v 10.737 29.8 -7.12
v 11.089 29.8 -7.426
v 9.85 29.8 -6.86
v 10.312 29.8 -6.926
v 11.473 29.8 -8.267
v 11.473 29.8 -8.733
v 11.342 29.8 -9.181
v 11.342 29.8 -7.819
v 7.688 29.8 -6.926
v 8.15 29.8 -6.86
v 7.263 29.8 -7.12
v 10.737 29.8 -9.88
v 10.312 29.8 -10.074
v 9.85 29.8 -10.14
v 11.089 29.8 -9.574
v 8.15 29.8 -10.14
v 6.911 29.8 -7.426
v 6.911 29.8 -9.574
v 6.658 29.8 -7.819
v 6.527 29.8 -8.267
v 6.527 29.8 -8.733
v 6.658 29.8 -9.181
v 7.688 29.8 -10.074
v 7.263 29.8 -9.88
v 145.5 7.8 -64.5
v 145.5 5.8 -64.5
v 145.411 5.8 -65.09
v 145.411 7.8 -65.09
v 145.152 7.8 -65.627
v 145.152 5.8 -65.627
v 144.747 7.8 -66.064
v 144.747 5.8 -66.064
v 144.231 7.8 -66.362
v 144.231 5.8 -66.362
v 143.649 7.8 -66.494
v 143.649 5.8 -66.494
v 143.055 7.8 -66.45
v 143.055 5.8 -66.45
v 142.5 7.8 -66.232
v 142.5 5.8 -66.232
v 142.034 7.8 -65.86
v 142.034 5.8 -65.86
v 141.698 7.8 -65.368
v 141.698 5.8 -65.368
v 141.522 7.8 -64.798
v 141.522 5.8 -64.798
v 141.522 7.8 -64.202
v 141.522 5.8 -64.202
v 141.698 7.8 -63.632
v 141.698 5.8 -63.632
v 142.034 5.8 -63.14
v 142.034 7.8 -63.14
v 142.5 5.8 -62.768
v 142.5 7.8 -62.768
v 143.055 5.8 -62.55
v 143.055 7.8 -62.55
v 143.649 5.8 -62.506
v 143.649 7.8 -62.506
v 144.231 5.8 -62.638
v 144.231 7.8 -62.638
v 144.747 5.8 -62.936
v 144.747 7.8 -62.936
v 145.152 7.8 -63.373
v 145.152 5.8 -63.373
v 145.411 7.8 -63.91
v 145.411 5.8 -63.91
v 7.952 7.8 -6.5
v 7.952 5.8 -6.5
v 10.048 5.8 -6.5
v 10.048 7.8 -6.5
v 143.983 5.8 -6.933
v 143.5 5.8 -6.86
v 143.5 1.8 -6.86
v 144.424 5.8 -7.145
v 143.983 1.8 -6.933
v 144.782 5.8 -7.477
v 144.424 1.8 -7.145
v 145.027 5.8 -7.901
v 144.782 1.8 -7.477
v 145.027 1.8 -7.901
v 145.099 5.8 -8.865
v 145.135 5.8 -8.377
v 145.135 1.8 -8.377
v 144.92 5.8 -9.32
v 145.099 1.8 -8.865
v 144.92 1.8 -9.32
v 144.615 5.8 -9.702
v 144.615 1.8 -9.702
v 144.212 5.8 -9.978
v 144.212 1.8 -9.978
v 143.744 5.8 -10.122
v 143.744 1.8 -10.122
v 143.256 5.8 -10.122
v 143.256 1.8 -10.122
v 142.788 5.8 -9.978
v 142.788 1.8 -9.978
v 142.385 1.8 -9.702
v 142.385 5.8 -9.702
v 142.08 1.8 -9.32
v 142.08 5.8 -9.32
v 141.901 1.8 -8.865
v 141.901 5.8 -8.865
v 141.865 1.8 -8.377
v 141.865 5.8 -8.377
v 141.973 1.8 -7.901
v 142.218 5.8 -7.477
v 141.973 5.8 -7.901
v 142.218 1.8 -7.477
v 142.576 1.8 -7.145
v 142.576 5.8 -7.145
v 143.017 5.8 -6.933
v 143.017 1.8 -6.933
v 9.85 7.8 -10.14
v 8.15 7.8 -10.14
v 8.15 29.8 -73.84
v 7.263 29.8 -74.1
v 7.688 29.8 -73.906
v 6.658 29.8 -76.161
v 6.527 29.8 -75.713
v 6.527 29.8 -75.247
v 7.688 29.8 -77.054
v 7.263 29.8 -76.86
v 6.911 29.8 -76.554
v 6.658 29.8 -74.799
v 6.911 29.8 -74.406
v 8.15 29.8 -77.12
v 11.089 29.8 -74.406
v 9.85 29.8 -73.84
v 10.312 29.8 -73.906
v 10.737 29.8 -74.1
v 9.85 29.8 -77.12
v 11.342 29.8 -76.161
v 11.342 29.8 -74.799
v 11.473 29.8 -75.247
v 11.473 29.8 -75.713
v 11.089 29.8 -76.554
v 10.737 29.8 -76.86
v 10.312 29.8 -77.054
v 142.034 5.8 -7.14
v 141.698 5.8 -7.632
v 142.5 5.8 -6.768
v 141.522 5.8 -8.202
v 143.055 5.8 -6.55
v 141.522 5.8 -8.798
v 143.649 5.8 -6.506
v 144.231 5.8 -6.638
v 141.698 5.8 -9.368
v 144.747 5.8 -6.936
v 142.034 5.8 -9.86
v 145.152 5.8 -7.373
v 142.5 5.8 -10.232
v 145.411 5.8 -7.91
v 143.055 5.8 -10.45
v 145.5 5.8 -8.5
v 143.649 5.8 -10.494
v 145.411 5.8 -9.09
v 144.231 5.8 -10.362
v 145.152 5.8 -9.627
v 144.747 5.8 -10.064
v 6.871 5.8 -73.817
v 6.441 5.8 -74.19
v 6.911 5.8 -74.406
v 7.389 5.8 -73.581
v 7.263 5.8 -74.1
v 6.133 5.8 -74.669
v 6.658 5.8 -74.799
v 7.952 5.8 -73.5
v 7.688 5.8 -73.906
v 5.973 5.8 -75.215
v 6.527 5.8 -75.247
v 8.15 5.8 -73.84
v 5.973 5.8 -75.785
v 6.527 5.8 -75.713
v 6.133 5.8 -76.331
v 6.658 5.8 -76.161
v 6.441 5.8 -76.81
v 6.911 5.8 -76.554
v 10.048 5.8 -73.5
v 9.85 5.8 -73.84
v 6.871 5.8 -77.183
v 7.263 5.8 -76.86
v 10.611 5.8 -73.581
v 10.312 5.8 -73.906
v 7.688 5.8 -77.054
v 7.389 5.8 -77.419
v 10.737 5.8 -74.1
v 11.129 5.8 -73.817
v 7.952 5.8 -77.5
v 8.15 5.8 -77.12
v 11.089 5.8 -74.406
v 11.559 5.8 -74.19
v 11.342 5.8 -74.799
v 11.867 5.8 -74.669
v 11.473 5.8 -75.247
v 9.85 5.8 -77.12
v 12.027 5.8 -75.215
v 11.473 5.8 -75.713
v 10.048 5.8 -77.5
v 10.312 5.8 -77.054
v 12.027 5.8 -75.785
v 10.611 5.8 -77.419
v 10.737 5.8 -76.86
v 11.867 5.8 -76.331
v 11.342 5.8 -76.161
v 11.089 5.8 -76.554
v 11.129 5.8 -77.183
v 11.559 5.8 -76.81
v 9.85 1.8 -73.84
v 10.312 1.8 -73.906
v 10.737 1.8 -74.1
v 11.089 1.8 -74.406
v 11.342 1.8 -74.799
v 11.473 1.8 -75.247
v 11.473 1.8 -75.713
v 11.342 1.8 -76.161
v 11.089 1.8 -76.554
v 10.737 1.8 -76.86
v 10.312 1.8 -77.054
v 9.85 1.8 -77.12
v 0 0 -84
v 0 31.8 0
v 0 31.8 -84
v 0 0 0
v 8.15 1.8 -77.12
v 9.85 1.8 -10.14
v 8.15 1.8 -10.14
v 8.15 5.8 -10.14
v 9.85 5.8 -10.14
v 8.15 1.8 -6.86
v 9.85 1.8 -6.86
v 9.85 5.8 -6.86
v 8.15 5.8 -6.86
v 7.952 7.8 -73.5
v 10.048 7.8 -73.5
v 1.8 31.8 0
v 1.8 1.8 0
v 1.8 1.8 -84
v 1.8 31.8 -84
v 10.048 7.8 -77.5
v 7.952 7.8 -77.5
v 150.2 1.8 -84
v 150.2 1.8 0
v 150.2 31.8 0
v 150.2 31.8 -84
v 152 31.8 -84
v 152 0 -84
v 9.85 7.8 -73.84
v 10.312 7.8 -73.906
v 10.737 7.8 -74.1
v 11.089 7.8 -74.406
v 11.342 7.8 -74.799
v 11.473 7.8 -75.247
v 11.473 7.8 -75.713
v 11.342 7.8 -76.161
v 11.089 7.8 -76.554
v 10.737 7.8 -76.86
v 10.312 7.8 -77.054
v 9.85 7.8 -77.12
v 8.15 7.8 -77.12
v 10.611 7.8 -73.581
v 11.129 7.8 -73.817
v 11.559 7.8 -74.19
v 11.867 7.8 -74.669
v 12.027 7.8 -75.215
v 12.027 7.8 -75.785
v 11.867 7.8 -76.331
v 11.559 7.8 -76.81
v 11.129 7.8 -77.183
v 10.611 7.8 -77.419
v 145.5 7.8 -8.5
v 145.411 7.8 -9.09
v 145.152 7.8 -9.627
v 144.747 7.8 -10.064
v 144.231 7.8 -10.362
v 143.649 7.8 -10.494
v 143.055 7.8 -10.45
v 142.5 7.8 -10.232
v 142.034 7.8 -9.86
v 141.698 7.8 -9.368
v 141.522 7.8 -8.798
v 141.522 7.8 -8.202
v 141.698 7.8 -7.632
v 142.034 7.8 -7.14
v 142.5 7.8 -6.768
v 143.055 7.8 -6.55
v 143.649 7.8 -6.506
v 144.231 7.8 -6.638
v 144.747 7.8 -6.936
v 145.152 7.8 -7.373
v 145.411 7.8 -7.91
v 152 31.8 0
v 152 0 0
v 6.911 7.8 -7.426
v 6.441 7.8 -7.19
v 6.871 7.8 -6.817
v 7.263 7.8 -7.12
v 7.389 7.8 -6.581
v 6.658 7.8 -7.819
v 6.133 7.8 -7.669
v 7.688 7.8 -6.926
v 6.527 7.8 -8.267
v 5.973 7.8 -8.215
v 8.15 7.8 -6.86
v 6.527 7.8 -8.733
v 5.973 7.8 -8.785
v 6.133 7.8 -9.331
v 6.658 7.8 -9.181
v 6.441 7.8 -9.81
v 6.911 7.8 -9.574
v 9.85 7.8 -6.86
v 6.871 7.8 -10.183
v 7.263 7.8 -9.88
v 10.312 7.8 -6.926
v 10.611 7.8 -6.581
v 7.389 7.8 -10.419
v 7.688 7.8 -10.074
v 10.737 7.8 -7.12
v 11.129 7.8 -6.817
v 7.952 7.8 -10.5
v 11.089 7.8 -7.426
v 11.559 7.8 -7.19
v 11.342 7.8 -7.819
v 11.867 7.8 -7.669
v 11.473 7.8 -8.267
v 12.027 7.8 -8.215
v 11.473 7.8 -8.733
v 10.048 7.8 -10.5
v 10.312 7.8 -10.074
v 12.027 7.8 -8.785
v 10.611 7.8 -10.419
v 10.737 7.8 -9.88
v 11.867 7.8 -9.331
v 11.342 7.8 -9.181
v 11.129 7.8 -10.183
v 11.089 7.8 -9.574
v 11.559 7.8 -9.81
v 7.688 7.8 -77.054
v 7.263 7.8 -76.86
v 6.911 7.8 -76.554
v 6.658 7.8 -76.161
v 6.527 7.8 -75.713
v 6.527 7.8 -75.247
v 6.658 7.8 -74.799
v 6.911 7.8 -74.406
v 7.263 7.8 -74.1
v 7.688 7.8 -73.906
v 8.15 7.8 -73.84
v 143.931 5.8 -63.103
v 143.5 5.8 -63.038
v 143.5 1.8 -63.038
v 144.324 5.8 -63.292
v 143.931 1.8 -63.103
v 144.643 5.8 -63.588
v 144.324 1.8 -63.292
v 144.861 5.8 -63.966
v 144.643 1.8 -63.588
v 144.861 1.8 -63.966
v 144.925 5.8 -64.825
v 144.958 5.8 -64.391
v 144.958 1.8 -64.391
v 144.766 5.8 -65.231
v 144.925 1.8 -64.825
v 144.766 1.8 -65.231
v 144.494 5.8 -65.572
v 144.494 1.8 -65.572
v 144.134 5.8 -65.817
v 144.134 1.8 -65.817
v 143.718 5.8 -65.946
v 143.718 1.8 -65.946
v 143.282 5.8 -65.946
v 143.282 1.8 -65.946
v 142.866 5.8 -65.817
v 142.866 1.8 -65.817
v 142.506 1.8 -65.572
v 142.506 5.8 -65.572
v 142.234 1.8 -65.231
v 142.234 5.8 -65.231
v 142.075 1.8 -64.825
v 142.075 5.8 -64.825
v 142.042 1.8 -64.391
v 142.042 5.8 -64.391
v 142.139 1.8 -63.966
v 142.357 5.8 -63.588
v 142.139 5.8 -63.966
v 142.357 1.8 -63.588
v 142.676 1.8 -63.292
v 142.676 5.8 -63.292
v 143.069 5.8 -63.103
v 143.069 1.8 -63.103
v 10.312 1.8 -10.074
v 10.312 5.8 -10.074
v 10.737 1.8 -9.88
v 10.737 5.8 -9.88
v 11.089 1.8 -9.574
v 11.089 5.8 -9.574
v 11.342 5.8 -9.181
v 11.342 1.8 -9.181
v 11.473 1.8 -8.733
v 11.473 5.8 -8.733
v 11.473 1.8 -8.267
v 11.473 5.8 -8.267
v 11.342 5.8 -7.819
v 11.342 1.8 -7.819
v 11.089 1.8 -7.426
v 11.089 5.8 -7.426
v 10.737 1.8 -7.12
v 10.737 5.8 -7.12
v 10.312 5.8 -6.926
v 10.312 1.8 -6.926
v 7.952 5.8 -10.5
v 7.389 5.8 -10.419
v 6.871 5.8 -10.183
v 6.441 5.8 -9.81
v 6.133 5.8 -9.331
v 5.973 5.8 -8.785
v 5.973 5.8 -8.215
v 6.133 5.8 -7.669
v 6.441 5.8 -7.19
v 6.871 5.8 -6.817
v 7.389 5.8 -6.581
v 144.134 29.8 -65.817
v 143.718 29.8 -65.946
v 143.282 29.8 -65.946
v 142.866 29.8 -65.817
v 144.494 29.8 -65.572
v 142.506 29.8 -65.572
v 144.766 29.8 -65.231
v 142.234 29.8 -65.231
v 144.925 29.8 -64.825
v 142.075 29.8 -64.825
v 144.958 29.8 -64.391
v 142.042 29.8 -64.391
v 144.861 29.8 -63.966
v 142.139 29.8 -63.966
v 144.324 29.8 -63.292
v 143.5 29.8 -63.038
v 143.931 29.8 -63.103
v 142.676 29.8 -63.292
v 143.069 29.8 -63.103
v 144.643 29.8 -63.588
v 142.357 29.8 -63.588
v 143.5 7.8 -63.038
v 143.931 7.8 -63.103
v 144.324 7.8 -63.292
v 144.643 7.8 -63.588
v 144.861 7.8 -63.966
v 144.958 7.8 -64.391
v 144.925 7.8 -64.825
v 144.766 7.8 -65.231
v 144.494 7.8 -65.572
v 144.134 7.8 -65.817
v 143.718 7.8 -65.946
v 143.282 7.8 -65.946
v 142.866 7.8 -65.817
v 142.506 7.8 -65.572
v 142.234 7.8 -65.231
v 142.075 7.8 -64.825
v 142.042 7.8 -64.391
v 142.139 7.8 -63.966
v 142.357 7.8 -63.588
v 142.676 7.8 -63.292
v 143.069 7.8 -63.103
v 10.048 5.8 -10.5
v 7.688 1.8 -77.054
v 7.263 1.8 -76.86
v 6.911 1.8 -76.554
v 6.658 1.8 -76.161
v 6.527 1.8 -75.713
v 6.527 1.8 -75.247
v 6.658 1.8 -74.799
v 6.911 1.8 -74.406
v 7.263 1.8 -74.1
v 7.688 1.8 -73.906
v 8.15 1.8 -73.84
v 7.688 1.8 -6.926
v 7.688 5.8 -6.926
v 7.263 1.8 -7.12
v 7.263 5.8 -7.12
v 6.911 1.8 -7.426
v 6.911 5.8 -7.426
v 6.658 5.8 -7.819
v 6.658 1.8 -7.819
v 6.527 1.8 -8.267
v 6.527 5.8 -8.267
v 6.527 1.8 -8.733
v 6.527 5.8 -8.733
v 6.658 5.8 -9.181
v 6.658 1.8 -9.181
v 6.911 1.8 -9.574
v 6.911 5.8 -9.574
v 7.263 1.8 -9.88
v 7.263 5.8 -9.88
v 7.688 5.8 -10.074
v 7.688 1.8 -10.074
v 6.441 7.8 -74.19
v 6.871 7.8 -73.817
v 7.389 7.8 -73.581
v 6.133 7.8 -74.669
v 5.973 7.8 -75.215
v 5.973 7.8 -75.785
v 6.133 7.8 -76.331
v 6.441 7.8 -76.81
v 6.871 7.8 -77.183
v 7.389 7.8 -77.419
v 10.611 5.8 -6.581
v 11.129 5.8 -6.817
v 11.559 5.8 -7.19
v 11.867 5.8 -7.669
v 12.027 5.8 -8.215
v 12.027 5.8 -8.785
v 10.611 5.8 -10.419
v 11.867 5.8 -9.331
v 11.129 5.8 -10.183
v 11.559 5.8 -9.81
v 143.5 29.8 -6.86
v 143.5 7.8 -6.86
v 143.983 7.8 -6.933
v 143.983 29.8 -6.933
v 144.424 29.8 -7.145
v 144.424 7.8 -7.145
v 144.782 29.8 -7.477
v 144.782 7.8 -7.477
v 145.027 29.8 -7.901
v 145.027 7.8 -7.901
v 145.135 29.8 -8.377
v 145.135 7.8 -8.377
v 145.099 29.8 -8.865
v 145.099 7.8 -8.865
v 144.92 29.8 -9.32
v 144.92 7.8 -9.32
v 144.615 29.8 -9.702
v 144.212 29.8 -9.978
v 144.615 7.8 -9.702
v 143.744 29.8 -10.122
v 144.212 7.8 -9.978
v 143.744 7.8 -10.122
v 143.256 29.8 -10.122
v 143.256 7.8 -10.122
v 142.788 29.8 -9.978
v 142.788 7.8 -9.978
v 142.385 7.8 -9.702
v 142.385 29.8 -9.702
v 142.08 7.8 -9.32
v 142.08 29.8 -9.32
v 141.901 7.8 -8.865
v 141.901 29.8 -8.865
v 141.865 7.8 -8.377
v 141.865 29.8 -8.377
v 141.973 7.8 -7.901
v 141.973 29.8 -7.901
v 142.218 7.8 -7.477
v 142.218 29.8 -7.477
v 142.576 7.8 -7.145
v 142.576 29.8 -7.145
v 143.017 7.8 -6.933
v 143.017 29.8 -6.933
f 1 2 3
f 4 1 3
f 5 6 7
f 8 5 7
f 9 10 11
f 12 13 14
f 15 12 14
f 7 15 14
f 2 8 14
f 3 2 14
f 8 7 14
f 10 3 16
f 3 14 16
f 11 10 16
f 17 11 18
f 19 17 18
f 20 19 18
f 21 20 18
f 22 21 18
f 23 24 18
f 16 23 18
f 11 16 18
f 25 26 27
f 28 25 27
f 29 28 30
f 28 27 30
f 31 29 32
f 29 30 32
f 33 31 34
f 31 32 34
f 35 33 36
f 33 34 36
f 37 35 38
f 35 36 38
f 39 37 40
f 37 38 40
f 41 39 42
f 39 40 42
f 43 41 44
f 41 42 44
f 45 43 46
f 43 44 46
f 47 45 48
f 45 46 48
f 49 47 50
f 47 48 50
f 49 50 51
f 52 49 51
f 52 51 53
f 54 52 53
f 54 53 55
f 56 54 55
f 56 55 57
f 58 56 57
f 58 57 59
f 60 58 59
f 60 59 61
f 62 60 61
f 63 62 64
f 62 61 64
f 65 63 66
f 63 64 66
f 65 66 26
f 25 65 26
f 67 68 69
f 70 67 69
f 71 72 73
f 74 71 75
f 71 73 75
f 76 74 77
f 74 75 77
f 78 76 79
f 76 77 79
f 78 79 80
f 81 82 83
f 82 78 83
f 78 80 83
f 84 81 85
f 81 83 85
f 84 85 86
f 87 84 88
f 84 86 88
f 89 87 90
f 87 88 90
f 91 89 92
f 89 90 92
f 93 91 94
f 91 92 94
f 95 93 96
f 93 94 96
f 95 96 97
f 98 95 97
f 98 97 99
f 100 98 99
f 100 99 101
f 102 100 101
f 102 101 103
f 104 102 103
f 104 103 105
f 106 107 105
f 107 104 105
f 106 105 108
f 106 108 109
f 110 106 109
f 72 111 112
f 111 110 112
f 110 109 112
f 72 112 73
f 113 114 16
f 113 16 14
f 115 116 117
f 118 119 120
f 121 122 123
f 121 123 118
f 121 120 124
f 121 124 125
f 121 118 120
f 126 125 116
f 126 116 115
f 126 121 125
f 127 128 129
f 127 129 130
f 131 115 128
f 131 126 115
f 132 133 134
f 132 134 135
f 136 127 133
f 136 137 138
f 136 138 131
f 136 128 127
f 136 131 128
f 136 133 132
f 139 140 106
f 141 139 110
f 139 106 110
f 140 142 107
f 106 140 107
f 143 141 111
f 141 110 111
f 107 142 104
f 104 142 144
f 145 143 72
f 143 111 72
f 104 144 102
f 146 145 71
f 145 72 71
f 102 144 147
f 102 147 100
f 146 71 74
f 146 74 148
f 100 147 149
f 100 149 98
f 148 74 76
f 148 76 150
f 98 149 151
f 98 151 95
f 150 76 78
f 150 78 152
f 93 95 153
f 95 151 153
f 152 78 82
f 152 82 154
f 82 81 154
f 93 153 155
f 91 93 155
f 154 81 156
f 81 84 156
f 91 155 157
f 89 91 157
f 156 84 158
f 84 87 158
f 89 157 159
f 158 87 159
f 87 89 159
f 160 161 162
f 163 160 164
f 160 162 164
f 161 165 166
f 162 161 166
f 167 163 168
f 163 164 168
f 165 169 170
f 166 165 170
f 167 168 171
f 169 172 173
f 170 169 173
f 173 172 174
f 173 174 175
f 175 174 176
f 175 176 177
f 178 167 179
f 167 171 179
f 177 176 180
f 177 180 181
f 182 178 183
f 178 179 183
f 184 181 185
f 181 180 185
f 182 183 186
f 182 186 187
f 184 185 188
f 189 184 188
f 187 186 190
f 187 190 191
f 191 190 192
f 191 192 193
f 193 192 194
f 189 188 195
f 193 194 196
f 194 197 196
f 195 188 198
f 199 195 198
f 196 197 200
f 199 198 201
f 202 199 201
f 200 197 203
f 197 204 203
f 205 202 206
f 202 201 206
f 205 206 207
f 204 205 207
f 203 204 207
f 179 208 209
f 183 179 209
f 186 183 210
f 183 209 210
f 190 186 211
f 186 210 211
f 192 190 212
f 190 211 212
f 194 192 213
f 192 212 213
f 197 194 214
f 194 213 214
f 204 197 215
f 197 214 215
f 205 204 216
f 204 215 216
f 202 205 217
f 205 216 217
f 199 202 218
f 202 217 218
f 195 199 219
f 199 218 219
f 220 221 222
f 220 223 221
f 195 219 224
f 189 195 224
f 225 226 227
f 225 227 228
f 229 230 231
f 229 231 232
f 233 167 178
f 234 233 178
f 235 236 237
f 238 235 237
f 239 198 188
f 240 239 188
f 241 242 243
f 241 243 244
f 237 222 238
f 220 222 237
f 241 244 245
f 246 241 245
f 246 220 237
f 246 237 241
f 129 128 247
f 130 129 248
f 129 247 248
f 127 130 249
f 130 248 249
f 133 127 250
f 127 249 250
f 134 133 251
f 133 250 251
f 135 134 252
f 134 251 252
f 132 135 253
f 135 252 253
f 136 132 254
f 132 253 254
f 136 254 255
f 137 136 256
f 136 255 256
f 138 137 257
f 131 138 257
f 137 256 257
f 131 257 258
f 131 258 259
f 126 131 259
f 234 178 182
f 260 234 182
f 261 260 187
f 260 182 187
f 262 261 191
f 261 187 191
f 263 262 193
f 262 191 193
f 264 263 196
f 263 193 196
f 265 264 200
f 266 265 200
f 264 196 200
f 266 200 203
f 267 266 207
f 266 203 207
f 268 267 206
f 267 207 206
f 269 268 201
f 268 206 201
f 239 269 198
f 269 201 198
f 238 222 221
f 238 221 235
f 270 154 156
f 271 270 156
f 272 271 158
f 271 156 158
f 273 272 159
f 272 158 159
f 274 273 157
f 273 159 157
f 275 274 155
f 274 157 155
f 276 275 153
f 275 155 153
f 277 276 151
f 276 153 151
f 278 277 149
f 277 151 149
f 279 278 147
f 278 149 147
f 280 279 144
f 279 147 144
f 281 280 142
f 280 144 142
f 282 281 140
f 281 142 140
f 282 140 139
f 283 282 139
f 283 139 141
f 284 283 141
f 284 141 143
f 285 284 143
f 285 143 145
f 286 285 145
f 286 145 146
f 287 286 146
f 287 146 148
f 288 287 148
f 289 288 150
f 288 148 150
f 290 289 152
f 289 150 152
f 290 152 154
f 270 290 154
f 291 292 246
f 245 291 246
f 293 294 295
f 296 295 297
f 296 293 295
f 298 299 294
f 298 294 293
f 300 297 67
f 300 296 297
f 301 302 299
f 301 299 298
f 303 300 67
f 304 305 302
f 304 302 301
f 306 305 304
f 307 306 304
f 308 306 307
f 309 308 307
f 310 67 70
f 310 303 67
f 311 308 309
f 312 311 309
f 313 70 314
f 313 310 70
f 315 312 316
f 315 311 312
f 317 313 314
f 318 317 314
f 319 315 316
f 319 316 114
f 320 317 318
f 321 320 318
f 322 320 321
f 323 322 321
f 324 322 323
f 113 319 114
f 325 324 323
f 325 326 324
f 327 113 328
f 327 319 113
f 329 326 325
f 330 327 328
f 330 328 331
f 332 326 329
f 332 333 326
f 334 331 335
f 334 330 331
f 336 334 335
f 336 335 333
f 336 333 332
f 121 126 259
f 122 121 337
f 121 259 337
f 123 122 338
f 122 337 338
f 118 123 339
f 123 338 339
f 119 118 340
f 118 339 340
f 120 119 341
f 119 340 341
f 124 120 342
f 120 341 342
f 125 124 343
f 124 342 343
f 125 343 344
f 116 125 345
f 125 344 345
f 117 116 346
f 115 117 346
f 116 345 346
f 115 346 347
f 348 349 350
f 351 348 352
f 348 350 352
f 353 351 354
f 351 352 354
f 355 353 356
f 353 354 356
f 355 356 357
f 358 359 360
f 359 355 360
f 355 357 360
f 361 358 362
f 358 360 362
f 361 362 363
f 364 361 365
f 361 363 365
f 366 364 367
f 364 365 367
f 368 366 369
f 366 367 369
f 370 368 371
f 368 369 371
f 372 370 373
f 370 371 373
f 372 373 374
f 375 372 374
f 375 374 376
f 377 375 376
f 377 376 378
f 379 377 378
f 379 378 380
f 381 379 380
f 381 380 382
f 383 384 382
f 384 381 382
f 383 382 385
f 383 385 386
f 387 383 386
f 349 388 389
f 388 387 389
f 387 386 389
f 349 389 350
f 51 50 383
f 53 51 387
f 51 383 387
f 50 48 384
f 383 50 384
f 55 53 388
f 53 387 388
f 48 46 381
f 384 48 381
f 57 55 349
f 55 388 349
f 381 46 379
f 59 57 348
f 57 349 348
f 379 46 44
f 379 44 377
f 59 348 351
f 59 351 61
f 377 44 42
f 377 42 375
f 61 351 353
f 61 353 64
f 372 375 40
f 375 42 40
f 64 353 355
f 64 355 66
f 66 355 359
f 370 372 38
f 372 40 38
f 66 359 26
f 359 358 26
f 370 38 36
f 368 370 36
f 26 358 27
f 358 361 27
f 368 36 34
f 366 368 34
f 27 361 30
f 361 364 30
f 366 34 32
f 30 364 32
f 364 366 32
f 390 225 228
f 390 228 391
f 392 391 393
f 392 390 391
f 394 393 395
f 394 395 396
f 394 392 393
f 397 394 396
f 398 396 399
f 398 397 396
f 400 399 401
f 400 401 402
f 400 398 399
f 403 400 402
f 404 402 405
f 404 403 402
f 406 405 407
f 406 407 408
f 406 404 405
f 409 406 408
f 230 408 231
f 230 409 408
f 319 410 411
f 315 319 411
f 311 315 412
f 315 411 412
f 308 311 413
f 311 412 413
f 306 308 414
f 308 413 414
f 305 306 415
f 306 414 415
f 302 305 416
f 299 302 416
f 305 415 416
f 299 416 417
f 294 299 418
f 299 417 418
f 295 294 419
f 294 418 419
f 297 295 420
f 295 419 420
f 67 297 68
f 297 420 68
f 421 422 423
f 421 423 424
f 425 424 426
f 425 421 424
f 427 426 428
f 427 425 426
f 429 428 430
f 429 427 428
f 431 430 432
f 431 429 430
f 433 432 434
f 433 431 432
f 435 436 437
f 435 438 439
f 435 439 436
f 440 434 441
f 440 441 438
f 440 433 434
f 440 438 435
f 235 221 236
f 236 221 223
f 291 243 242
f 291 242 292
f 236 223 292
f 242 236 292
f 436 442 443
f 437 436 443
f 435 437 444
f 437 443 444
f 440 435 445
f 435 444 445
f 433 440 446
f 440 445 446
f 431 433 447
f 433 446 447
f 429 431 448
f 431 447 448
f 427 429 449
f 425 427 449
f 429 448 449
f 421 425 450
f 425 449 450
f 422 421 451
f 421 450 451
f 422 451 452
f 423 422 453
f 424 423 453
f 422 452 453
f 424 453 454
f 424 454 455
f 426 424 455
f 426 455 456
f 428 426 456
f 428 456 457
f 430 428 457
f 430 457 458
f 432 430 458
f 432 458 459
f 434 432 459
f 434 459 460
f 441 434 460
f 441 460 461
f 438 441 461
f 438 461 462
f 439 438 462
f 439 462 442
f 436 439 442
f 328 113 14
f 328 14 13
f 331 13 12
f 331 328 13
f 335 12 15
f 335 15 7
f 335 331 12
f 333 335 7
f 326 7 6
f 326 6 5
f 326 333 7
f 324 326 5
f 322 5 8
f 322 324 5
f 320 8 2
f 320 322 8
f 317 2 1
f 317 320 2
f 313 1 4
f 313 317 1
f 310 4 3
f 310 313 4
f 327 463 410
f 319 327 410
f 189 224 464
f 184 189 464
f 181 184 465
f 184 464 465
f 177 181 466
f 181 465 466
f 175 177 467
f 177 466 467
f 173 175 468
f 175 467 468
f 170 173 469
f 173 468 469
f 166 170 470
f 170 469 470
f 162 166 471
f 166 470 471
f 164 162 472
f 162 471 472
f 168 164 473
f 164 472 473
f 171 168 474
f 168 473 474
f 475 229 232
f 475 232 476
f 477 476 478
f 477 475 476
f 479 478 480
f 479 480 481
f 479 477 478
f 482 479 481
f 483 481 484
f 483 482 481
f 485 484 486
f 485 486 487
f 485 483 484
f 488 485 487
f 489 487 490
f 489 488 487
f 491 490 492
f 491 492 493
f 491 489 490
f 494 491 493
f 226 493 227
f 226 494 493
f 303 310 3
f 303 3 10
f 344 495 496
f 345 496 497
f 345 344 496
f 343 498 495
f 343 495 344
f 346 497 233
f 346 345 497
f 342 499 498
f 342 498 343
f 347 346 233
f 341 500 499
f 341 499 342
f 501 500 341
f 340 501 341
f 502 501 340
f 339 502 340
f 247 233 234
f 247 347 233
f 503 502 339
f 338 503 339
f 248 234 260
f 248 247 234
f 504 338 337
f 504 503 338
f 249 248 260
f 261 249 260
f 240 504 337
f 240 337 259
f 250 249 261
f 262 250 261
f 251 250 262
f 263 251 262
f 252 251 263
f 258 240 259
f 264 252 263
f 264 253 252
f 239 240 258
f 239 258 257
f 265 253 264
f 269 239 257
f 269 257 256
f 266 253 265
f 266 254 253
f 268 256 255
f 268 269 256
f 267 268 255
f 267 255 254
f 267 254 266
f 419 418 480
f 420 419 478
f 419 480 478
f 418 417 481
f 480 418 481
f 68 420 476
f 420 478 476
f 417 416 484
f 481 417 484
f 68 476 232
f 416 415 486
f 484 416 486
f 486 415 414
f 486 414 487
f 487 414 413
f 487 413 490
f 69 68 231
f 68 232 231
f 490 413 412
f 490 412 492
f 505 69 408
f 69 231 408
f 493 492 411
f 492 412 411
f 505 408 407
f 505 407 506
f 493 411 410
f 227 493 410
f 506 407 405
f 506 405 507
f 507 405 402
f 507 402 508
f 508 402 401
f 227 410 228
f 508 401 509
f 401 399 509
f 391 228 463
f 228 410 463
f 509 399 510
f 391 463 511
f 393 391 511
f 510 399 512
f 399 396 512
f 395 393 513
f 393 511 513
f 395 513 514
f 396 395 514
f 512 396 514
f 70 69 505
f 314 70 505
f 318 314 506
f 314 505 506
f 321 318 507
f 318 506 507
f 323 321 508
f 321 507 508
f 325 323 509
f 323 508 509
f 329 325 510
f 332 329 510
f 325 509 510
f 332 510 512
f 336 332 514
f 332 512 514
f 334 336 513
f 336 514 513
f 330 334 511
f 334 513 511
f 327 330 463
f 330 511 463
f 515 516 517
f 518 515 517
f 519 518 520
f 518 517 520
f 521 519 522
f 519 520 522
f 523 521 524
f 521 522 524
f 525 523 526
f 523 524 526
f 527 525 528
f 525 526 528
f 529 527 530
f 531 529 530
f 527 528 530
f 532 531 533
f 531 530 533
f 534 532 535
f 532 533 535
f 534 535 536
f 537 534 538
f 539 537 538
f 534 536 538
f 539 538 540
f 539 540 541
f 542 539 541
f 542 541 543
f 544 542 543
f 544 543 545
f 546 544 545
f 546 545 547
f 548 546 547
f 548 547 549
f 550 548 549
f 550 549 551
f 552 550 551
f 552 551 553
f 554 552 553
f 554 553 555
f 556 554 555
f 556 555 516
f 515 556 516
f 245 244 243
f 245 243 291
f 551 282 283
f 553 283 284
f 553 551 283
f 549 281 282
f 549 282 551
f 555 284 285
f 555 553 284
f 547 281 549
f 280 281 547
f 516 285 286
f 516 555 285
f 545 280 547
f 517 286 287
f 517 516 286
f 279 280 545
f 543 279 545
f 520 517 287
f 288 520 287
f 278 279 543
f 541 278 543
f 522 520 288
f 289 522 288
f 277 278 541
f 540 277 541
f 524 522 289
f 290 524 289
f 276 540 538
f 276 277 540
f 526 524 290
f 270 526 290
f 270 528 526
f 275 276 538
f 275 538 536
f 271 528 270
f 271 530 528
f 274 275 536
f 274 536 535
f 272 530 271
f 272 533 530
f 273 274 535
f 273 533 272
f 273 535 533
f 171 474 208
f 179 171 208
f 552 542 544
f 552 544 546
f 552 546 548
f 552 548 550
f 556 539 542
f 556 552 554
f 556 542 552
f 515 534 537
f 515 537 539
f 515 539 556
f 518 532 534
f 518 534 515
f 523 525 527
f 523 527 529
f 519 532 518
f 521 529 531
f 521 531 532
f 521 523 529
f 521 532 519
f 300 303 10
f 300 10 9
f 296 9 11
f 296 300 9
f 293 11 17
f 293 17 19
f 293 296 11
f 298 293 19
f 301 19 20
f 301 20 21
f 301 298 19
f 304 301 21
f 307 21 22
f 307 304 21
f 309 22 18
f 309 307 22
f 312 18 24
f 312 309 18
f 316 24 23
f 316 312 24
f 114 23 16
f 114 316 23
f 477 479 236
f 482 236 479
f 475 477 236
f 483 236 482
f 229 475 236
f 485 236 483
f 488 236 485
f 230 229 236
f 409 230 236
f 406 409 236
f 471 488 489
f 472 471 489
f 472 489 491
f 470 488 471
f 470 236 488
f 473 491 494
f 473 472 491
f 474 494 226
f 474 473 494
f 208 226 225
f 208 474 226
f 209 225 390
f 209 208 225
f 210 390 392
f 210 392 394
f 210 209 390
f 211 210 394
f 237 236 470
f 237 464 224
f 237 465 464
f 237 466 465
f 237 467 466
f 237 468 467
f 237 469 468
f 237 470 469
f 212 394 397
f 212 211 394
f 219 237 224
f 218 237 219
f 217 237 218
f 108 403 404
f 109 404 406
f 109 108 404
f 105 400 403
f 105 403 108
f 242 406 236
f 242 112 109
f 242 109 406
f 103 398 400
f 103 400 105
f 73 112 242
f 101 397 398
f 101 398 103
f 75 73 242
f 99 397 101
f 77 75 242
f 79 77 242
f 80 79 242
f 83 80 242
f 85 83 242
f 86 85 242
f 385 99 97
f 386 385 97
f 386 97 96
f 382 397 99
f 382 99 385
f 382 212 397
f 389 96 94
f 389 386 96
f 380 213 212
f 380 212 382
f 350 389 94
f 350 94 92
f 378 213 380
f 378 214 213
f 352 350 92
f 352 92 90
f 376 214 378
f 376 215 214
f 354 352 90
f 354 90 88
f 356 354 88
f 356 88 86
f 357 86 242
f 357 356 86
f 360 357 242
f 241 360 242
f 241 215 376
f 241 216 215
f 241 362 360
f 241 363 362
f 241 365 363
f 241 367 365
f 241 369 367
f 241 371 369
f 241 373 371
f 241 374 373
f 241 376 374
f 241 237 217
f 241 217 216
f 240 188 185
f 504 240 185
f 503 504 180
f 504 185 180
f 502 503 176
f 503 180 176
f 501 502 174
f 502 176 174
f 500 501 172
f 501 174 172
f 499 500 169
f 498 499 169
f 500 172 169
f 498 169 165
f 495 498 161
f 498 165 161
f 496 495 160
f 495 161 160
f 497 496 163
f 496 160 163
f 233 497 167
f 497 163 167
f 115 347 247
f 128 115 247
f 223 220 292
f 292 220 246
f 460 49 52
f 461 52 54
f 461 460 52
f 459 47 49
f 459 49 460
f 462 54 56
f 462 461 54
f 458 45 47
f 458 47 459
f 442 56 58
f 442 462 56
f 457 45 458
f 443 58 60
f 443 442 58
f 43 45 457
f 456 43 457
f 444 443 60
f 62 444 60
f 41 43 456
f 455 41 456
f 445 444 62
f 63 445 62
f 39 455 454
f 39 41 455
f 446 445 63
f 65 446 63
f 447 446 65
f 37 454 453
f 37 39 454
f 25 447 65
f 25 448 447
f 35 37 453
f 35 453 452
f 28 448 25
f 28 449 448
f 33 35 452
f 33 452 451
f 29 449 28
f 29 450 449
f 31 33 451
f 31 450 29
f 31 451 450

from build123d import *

# Parameters (mm, degrees)
SKETCH_1_W      = 152
SKETCH_1_H      = 84
EXTRUDE_1_DEPTH = 1.8
SKETCH_3_R      = 1.64
SKETCH_3_R_2    = 1.462072503
EXTRUDE_2_DEPTH = 28
SKETCH_3_2_R    = 1.64
SKETCH_3_2_R_2  = 1.462072503
EXTRUDE_3_DEPTH = 4.5
EXTRUDE_START   = -24
SKETCH_4_R      = 2
EXTRUDE_4_DEPTH = 2
SKETCH_10_W     = 1.8
SKETCH_10_H     = 84
EXTRUDE_6_DEPTH = 30


with BuildPart() as part:
    # 草图1 → 凸台-拉伸1 (new body)
    with BuildSketch(Plane(origin=(0, 0, 0), x_dir=(1, 0, 0), z_dir=(0, 1, 0))):
        with Locations((76, 42)):
            Rectangle(SKETCH_1_W, SKETCH_1_H)
    extrude(amount=EXTRUDE_1_DEPTH)

    # 草图3 → 凸台-拉伸2 (add)
    with BuildSketch(Plane(origin=(0, 1.8, 0), x_dir=(1, 0, 0), z_dir=(0, 1, 0))):
        with Locations((143.5, 8.5)):
            Circle(SKETCH_3_R)
        with Locations((143.5, 64.5)):
            Circle(SKETCH_3_R_2)
        with BuildLine():
            Line((8.15, 10.14), (9.85, 10.14))
            ThreePointArc((9.85, 10.14), (11.49, 8.5), (9.85, 6.86))
            Line((9.85, 6.86), (8.15, 6.86))
            ThreePointArc((8.15, 6.86), (6.51, 8.5), (8.15, 10.14))
        make_face()
        with BuildLine():
            Line((8.15, 73.84), (9.85, 73.84))
            ThreePointArc((9.85, 73.84), (11.49, 75.48), (9.85, 77.12))
            Line((9.85, 77.12), (8.15, 77.12))
            ThreePointArc((8.15, 77.12), (6.51, 75.48), (8.15, 73.84))
        make_face()
    extrude(amount=EXTRUDE_2_DEPTH)

    # 草图3<2> → 凸台-拉伸3 (add)
    with BuildSketch(Plane(origin=(0, 1.8, 0), x_dir=(1, 0, 0), z_dir=(0, 1, 0))):
        with Locations((143.5, 8.5)):
            Circle(SKETCH_3_2_R)
        with Locations((143.5, 64.5)):
            Circle(SKETCH_3_2_R_2)
        with BuildLine():
            Line((8.15, 10.14), (9.85, 10.14))
            ThreePointArc((9.85, 10.14), (11.49, 8.5), (9.85, 6.86))
            Line((9.85, 6.86), (8.15, 6.86))
            ThreePointArc((8.15, 6.86), (6.51, 8.5), (8.15, 10.14))
        make_face()
        with BuildLine():
            Line((8.15, 73.84), (9.85, 73.84))
            ThreePointArc((9.85, 73.84), (11.49, 75.48), (9.85, 77.12))
            Line((9.85, 77.12), (8.15, 77.12))
            ThreePointArc((8.15, 77.12), (6.51, 75.48), (8.15, 73.84))
        make_face()
    extrude(amount=EXTRUDE_3_DEPTH)

    # 草图4 → 凸台-拉伸4 (add)
    with BuildSketch(Plane(origin=(0, 29.8, 0), x_dir=(1, 0, 0), z_dir=(0, 1, 0)).offset(EXTRUDE_START)):
        with Locations((143.5, 64.5)):
            Circle(SKETCH_4_R)
        with Locations((143.5, 8.5)):
            Circle(SKETCH_4_R)
        with BuildLine():
            Line((7.952208314, 10.5), (10.047791686, 10.5))
            ThreePointArc((10.047791686, 10.5), (12.047791686, 8.5), (10.047791686, 6.5))
            Line((10.047791686, 6.5), (7.952208314, 6.5))
            ThreePointArc((7.952208314, 6.5), (5.952208314, 8.5), (7.952208314, 10.5))
        make_face()
        with BuildLine():
            Line((7.952208314, 73.5), (10.047791686, 73.5))
            ThreePointArc((10.047791686, 73.5), (12.047791686, 75.5), (10.047791686, 77.5))
            Line((10.047791686, 77.5), (7.952208314, 77.5))
            ThreePointArc((7.952208314, 77.5), (5.952208314, 75.5), (7.952208314, 73.5))
        make_face()
    extrude(amount=EXTRUDE_4_DEPTH)

    # 草图10 → 凸台-拉伸6 (add)
    with BuildSketch(Plane(origin=(0, 1.8, 0), x_dir=(1, 0, 0), z_dir=(0, 1, 0))):
        with Locations((0.9, 42)):
            Rectangle(SKETCH_10_W, SKETCH_10_H)
        with Locations((151.1, 42)):
            Rectangle(SKETCH_10_W, SKETCH_10_H)
    extrude(amount=EXTRUDE_6_DEPTH)


solid = part.part
